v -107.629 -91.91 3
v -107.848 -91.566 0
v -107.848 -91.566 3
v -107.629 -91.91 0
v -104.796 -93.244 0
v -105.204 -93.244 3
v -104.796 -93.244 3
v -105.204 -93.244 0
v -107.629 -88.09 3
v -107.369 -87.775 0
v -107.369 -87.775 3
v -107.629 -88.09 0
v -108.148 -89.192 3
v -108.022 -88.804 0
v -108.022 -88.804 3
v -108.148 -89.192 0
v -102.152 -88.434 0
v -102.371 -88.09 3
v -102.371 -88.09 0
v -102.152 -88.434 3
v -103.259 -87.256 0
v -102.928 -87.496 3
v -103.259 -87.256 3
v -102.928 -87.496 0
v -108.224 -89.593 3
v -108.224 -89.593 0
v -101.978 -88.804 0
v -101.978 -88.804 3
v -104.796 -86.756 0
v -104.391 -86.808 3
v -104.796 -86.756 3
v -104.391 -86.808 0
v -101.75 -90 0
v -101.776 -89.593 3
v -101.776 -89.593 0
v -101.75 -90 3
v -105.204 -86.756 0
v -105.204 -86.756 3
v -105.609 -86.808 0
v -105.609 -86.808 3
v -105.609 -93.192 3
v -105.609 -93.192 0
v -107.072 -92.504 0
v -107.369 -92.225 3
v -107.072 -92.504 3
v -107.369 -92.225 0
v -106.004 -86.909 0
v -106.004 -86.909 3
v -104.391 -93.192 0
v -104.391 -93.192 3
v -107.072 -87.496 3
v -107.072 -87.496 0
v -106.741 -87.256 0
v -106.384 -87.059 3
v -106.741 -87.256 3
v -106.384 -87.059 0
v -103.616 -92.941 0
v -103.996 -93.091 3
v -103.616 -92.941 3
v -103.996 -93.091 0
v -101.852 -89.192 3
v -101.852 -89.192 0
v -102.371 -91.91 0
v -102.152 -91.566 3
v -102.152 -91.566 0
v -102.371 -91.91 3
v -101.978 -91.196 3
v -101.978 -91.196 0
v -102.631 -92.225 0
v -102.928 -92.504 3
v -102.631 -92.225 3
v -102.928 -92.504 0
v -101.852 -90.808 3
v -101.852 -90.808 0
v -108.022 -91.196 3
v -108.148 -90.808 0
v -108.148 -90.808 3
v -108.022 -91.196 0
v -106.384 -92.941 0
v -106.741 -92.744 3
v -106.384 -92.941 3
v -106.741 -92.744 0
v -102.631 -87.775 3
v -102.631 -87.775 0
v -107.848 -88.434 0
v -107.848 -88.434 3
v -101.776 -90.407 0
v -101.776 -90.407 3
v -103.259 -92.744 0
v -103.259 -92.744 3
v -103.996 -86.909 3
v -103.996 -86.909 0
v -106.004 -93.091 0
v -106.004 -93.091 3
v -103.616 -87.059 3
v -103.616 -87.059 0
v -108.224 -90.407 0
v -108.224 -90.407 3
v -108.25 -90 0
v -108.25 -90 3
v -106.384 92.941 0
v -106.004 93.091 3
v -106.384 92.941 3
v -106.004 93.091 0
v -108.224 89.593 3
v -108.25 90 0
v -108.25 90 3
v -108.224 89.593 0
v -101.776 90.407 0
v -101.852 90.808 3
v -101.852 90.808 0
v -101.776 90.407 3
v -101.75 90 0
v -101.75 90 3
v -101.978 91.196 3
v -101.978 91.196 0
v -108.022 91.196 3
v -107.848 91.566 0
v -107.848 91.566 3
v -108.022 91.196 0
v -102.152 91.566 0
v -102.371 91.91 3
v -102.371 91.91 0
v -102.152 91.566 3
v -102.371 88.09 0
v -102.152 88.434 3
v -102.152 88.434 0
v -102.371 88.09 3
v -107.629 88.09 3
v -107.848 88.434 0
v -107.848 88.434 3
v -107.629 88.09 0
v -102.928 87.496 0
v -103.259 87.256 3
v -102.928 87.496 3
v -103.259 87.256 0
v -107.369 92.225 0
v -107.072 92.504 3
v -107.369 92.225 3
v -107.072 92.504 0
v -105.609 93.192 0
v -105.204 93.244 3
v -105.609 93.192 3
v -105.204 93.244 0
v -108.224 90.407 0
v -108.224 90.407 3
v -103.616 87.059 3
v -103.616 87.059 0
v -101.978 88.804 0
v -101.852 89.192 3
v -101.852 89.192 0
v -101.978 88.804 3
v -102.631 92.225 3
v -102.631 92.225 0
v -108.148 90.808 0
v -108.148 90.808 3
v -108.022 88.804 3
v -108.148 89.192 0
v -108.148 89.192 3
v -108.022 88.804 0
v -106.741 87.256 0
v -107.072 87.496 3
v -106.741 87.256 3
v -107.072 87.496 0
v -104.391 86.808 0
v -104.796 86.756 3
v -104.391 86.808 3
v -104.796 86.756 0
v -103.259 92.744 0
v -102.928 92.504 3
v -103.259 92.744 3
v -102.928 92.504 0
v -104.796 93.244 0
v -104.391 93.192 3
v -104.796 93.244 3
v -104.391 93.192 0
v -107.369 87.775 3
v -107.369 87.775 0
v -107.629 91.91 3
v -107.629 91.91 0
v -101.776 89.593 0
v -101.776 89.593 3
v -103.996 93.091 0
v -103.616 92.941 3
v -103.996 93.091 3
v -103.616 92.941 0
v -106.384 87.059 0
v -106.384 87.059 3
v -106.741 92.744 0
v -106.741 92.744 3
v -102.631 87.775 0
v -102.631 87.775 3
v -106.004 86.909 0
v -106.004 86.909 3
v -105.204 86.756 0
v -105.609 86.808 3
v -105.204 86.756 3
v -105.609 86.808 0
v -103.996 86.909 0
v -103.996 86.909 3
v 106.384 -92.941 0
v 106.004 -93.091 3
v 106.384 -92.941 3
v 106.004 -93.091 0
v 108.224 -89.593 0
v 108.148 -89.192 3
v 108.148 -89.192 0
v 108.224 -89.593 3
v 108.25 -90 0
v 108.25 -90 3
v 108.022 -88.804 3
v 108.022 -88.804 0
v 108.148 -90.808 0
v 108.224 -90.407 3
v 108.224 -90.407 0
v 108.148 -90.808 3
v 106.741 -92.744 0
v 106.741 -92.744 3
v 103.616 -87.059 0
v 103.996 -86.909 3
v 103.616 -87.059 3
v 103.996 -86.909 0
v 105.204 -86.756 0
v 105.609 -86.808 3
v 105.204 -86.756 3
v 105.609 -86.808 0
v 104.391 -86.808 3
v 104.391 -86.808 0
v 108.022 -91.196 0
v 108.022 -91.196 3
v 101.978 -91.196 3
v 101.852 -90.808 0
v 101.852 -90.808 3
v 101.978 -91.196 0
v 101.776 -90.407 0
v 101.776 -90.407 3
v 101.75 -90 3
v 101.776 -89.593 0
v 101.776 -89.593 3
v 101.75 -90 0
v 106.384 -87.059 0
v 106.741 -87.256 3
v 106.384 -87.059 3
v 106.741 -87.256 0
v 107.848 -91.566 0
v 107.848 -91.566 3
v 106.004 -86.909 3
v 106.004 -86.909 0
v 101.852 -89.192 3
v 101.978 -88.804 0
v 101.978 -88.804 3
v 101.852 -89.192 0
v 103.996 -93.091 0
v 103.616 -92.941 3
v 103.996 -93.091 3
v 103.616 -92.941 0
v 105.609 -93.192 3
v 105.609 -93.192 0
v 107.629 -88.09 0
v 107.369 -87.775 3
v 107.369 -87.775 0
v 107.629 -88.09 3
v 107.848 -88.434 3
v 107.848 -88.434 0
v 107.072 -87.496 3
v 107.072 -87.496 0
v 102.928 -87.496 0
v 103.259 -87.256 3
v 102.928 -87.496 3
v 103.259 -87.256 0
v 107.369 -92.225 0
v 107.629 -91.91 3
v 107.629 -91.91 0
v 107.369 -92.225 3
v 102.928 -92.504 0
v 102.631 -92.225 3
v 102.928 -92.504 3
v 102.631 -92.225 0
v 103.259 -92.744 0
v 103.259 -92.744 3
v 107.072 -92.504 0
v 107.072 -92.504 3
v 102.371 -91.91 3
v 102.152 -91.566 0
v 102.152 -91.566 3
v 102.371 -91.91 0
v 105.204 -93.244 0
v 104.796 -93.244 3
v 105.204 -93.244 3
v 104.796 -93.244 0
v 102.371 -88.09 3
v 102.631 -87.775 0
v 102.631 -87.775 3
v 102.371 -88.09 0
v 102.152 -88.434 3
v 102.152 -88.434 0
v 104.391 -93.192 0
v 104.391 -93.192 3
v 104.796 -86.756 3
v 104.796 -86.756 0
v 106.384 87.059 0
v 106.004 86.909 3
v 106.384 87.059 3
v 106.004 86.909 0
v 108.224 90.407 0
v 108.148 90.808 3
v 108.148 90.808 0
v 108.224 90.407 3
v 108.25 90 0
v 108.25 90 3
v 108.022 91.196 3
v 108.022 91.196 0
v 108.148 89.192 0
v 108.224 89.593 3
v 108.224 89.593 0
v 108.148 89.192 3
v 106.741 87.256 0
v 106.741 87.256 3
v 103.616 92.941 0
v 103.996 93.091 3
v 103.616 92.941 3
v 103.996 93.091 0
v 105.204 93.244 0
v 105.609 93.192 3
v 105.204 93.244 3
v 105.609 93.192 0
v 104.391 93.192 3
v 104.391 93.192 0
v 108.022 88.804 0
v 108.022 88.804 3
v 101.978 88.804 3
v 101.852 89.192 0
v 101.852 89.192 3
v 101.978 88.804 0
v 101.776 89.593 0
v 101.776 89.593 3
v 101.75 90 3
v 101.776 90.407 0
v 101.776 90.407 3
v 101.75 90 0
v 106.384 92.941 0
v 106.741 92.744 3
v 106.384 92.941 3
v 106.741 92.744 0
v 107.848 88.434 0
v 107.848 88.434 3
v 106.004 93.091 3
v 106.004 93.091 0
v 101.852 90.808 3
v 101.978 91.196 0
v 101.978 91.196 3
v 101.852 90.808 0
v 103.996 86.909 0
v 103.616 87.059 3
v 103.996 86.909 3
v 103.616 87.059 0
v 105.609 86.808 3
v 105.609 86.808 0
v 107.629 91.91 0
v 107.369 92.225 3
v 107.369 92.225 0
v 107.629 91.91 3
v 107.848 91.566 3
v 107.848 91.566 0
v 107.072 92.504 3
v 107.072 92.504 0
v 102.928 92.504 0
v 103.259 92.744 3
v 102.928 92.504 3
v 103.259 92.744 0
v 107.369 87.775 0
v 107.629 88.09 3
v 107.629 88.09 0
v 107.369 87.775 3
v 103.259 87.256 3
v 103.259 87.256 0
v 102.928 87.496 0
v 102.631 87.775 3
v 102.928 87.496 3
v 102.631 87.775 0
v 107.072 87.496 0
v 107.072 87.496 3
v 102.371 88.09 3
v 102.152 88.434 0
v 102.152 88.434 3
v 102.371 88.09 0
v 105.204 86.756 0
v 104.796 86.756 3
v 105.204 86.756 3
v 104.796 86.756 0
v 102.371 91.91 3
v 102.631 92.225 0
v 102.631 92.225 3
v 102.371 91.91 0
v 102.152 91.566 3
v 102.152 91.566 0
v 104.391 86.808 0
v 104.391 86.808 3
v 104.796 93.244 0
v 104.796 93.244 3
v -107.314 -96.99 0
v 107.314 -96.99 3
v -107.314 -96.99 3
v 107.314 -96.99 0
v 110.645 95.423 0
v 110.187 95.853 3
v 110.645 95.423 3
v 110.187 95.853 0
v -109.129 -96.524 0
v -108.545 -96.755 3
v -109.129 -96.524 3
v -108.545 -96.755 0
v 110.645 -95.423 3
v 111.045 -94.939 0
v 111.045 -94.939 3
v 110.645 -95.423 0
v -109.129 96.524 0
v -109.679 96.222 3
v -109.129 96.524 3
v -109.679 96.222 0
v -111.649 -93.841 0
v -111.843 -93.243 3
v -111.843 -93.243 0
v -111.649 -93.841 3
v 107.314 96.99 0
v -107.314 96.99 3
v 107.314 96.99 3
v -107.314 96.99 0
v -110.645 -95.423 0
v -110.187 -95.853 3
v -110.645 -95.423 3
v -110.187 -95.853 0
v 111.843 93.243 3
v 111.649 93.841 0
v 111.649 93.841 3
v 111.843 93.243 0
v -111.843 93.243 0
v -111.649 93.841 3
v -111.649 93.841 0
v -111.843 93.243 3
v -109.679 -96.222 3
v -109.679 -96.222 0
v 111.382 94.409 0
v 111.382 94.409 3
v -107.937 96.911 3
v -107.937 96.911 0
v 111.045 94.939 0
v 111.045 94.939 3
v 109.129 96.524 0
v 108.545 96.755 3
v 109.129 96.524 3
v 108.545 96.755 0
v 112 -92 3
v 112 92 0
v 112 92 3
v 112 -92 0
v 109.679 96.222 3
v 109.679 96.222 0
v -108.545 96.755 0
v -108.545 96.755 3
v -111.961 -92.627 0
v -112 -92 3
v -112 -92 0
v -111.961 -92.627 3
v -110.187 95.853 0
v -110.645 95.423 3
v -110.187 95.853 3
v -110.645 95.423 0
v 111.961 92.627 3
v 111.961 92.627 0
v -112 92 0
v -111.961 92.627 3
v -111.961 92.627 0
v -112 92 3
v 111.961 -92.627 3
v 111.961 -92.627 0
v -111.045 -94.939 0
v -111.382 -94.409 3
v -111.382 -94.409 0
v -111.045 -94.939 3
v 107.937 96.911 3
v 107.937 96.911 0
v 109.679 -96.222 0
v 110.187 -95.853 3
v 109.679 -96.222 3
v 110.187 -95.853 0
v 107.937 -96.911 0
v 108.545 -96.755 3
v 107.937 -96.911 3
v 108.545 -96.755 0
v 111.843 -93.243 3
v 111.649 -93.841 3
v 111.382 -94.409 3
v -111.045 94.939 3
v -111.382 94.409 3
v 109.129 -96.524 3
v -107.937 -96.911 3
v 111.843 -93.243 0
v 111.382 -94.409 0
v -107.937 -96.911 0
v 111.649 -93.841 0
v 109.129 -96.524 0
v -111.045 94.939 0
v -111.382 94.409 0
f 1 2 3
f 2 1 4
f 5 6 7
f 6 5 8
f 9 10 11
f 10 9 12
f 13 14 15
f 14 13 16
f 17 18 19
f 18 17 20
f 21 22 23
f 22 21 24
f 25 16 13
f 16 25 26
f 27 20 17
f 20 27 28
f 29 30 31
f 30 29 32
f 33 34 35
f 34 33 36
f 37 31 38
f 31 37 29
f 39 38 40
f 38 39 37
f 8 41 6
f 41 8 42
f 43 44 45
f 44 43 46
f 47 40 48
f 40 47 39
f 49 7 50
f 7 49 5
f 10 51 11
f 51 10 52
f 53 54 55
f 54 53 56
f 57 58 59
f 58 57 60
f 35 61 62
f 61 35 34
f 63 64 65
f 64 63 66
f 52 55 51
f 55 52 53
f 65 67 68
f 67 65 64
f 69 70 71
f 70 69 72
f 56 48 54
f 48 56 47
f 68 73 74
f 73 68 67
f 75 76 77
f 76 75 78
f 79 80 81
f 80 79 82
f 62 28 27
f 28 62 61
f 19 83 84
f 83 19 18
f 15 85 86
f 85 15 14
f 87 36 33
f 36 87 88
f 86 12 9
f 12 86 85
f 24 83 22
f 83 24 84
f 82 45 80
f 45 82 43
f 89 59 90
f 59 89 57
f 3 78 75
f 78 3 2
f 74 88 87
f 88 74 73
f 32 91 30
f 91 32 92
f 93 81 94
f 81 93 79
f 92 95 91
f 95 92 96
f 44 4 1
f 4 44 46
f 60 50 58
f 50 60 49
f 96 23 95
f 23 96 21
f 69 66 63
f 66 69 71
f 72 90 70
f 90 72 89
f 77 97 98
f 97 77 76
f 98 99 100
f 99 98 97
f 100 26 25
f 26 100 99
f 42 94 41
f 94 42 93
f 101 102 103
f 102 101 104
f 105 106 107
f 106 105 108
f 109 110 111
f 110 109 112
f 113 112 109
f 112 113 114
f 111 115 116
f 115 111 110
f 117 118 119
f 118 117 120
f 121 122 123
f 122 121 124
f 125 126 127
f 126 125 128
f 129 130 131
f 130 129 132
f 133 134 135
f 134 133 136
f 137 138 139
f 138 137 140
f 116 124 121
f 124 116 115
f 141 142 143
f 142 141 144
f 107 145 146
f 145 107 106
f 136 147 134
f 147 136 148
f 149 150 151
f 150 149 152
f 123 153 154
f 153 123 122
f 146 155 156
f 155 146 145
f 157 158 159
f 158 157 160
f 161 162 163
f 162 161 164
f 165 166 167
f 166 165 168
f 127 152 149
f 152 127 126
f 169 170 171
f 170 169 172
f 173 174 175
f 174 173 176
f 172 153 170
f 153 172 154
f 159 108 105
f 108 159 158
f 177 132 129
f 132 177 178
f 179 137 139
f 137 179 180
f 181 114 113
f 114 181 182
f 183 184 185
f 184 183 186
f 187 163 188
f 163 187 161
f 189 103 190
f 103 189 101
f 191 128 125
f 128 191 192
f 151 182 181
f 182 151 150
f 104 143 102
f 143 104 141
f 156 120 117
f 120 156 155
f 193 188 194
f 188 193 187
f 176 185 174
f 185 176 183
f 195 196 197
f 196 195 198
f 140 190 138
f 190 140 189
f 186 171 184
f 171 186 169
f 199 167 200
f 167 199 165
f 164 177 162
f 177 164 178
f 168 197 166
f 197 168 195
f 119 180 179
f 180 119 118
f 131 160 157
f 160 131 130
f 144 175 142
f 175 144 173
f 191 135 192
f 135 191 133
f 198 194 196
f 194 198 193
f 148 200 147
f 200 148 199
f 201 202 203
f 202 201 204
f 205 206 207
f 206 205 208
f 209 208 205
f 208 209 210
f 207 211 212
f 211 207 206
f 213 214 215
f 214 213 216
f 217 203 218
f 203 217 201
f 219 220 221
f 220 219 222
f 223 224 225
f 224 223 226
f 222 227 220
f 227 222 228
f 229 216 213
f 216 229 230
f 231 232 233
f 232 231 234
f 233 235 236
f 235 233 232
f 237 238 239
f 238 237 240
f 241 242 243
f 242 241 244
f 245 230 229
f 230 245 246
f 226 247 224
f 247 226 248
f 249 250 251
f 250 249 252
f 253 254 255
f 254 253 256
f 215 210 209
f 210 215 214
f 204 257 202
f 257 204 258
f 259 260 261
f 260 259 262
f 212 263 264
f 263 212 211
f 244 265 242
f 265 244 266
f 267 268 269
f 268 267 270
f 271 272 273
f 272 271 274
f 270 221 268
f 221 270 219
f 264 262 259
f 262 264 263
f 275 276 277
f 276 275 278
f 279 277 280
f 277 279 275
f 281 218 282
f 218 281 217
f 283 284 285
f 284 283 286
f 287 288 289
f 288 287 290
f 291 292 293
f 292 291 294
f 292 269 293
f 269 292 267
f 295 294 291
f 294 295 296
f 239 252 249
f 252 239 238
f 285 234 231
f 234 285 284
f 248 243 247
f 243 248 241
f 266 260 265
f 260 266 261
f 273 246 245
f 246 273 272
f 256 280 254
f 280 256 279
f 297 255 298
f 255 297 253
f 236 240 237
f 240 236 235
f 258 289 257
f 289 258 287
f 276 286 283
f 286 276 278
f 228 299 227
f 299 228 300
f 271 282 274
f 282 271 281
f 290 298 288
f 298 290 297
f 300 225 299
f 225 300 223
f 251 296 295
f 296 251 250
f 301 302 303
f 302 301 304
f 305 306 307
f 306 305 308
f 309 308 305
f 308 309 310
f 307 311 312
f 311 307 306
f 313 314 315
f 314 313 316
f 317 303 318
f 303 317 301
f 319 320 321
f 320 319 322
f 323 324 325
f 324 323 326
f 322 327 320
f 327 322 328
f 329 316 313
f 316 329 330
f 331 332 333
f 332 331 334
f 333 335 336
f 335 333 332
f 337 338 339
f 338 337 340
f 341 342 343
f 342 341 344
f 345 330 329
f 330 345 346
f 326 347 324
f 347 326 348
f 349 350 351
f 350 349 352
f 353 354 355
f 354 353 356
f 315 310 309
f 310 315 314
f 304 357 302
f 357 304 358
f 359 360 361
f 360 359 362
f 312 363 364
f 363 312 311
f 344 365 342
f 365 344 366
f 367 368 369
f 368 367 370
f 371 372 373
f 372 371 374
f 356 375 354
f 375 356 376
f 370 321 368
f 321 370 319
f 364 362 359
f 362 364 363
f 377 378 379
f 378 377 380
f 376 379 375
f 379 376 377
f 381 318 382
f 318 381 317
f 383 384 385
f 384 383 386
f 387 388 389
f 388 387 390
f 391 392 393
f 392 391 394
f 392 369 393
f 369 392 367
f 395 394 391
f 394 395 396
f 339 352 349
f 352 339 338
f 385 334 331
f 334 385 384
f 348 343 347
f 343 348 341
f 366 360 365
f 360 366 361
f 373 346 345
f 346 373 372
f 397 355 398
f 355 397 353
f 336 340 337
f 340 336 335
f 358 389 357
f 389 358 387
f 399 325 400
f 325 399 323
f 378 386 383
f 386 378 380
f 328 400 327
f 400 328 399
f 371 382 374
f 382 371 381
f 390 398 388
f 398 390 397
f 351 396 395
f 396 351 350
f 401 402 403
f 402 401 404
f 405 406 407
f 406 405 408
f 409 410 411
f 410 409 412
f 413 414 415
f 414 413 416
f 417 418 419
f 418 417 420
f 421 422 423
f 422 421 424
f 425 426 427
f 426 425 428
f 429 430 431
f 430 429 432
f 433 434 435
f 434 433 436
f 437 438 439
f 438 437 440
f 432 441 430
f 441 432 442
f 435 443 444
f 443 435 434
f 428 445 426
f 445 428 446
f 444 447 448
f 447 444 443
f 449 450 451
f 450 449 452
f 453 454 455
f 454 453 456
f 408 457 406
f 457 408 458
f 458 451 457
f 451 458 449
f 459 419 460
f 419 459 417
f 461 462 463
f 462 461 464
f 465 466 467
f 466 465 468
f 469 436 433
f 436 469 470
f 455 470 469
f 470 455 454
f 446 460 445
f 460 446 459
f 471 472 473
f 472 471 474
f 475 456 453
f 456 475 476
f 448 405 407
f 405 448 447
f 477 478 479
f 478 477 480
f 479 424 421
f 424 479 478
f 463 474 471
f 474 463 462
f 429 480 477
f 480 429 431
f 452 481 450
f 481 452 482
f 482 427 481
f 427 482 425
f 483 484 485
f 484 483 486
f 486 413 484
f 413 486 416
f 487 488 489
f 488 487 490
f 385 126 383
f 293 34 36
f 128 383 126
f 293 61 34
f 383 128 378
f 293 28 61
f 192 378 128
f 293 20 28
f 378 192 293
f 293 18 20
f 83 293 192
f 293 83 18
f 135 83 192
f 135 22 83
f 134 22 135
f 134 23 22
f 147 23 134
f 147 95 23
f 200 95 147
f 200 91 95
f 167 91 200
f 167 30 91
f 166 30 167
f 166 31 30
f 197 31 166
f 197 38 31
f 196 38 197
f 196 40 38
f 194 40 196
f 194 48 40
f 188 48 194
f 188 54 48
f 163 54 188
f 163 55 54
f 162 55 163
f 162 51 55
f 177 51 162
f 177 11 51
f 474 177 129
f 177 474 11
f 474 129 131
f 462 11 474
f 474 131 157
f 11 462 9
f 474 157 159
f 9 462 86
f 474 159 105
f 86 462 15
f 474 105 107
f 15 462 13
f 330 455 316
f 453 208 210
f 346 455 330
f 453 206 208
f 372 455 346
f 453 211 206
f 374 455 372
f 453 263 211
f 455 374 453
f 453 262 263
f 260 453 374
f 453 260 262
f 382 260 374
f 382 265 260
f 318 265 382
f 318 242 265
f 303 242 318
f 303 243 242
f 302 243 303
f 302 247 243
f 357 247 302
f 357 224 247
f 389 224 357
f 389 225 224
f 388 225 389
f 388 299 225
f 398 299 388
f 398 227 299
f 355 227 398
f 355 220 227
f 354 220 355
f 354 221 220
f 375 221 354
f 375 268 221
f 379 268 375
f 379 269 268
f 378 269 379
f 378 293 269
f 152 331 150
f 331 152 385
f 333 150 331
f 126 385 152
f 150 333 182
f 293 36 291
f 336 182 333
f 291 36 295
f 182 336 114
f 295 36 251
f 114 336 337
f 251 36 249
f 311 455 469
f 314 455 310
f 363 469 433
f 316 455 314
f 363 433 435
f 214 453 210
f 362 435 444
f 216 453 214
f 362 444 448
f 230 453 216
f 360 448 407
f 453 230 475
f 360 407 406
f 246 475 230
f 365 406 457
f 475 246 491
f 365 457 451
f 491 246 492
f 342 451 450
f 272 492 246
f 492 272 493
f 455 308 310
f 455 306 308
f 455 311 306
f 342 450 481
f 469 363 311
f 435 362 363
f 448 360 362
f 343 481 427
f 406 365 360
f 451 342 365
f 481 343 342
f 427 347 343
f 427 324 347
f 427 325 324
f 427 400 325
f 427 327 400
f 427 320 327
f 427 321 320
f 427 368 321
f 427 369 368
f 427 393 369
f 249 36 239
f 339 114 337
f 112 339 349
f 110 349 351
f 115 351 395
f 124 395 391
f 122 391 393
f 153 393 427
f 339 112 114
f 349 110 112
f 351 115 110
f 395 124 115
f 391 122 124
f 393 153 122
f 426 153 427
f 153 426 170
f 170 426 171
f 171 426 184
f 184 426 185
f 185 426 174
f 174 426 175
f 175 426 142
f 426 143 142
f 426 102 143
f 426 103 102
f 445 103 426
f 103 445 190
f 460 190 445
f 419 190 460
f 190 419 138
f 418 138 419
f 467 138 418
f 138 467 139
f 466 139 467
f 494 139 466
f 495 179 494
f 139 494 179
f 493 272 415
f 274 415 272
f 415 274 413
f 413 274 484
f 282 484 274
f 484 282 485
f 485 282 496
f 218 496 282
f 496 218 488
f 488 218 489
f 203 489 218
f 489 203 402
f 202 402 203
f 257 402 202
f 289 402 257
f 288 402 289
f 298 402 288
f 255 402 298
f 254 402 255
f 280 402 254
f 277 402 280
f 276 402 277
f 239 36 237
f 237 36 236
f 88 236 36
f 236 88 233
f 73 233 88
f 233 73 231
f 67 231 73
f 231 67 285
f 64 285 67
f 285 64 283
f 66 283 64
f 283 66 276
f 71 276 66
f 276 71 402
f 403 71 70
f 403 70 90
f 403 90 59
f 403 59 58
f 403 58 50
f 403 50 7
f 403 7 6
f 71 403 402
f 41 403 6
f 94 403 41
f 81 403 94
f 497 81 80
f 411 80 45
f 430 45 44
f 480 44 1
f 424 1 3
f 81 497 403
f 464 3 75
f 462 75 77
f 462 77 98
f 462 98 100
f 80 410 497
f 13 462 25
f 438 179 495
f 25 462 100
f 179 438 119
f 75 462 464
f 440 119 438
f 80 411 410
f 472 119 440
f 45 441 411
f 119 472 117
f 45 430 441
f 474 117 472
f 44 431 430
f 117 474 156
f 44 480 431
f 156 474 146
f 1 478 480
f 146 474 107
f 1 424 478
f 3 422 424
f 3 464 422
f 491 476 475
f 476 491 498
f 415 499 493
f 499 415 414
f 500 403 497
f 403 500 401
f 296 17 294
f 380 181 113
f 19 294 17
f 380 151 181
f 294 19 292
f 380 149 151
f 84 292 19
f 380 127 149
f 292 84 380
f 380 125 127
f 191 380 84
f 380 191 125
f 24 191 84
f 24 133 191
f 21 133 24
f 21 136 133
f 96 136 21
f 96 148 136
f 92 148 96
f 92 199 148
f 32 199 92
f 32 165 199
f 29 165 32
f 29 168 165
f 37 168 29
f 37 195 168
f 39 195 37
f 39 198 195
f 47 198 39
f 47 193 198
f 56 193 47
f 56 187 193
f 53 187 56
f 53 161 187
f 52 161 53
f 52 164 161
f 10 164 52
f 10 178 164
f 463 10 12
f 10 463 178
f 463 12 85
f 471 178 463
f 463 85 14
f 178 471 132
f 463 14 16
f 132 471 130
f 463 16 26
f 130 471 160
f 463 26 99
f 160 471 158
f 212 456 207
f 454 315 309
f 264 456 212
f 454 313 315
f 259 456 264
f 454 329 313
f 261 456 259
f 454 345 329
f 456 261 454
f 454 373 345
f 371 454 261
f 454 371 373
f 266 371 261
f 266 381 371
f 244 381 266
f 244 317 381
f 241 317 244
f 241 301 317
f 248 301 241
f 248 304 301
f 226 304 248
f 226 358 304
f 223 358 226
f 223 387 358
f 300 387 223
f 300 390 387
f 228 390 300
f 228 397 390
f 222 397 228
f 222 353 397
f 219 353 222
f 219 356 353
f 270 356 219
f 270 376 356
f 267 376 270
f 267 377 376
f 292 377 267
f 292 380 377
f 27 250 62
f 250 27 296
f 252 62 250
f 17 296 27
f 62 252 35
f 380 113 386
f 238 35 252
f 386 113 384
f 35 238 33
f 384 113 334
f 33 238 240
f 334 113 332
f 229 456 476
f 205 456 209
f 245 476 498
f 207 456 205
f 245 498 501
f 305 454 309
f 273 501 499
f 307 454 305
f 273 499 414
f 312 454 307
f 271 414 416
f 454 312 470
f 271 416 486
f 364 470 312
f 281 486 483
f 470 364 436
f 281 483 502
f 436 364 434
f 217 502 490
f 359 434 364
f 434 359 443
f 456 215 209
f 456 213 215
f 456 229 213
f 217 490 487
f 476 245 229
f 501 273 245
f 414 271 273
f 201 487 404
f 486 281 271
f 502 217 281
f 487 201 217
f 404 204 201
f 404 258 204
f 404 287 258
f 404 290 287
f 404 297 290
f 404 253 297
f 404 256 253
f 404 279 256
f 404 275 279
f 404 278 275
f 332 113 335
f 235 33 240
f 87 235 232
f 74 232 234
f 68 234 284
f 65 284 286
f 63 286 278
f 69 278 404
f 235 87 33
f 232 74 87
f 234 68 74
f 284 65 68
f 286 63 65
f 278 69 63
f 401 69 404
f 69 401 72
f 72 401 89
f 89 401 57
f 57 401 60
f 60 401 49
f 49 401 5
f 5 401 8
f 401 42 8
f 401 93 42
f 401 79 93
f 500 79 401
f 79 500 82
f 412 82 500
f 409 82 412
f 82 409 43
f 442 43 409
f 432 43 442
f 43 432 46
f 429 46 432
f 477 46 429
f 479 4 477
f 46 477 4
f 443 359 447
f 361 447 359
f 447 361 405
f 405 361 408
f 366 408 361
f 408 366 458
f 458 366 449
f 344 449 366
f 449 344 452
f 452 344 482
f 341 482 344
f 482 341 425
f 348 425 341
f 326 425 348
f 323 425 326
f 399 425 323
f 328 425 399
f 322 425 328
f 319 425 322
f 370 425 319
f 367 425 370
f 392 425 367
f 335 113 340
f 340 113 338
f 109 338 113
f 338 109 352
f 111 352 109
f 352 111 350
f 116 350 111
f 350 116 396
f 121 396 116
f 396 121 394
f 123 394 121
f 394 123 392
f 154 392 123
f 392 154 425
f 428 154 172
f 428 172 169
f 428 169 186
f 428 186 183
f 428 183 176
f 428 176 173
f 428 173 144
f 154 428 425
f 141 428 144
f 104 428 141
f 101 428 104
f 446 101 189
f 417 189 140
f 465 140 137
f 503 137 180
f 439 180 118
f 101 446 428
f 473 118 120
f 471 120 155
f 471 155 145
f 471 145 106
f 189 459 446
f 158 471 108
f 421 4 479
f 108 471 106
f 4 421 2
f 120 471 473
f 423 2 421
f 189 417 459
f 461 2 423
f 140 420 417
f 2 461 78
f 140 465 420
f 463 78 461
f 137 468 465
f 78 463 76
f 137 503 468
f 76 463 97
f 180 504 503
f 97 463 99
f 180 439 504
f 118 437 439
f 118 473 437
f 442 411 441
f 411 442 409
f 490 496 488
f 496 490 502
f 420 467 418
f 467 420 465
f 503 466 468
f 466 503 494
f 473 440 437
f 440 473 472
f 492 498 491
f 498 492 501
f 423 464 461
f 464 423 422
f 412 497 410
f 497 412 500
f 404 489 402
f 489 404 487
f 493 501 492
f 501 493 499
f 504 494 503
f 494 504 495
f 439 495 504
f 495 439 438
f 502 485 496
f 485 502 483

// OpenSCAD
$fn = 50;


difference() {
	union() {
		hull() {
			translate(v = [-107.0000000000, 92.0000000000, 0]) {
				cylinder(h = 3, r = 5);
			}
			translate(v = [107.0000000000, 92.0000000000, 0]) {
				cylinder(h = 3, r = 5);
			}
			translate(v = [-107.0000000000, -92.0000000000, 0]) {
				cylinder(h = 3, r = 5);
			}
			translate(v = [107.0000000000, -92.0000000000, 0]) {
				cylinder(h = 3, r = 5);
			}
		}
	}
	union() {
		translate(v = [-105.0000000000, -90.0000000000, -100.0000000000]) {
			cylinder(h = 200, r = 3.2500000000);
		}
		translate(v = [-105.0000000000, 90.0000000000, -100.0000000000]) {
			cylinder(h = 200, r = 3.2500000000);
		}
		translate(v = [105.0000000000, -90.0000000000, -100.0000000000]) {
			cylinder(h = 200, r = 3.2500000000);
		}
		translate(v = [105.0000000000, 90.0000000000, -100.0000000000]) {
			cylinder(h = 200, r = 3.2500000000);
		}
	}
}
